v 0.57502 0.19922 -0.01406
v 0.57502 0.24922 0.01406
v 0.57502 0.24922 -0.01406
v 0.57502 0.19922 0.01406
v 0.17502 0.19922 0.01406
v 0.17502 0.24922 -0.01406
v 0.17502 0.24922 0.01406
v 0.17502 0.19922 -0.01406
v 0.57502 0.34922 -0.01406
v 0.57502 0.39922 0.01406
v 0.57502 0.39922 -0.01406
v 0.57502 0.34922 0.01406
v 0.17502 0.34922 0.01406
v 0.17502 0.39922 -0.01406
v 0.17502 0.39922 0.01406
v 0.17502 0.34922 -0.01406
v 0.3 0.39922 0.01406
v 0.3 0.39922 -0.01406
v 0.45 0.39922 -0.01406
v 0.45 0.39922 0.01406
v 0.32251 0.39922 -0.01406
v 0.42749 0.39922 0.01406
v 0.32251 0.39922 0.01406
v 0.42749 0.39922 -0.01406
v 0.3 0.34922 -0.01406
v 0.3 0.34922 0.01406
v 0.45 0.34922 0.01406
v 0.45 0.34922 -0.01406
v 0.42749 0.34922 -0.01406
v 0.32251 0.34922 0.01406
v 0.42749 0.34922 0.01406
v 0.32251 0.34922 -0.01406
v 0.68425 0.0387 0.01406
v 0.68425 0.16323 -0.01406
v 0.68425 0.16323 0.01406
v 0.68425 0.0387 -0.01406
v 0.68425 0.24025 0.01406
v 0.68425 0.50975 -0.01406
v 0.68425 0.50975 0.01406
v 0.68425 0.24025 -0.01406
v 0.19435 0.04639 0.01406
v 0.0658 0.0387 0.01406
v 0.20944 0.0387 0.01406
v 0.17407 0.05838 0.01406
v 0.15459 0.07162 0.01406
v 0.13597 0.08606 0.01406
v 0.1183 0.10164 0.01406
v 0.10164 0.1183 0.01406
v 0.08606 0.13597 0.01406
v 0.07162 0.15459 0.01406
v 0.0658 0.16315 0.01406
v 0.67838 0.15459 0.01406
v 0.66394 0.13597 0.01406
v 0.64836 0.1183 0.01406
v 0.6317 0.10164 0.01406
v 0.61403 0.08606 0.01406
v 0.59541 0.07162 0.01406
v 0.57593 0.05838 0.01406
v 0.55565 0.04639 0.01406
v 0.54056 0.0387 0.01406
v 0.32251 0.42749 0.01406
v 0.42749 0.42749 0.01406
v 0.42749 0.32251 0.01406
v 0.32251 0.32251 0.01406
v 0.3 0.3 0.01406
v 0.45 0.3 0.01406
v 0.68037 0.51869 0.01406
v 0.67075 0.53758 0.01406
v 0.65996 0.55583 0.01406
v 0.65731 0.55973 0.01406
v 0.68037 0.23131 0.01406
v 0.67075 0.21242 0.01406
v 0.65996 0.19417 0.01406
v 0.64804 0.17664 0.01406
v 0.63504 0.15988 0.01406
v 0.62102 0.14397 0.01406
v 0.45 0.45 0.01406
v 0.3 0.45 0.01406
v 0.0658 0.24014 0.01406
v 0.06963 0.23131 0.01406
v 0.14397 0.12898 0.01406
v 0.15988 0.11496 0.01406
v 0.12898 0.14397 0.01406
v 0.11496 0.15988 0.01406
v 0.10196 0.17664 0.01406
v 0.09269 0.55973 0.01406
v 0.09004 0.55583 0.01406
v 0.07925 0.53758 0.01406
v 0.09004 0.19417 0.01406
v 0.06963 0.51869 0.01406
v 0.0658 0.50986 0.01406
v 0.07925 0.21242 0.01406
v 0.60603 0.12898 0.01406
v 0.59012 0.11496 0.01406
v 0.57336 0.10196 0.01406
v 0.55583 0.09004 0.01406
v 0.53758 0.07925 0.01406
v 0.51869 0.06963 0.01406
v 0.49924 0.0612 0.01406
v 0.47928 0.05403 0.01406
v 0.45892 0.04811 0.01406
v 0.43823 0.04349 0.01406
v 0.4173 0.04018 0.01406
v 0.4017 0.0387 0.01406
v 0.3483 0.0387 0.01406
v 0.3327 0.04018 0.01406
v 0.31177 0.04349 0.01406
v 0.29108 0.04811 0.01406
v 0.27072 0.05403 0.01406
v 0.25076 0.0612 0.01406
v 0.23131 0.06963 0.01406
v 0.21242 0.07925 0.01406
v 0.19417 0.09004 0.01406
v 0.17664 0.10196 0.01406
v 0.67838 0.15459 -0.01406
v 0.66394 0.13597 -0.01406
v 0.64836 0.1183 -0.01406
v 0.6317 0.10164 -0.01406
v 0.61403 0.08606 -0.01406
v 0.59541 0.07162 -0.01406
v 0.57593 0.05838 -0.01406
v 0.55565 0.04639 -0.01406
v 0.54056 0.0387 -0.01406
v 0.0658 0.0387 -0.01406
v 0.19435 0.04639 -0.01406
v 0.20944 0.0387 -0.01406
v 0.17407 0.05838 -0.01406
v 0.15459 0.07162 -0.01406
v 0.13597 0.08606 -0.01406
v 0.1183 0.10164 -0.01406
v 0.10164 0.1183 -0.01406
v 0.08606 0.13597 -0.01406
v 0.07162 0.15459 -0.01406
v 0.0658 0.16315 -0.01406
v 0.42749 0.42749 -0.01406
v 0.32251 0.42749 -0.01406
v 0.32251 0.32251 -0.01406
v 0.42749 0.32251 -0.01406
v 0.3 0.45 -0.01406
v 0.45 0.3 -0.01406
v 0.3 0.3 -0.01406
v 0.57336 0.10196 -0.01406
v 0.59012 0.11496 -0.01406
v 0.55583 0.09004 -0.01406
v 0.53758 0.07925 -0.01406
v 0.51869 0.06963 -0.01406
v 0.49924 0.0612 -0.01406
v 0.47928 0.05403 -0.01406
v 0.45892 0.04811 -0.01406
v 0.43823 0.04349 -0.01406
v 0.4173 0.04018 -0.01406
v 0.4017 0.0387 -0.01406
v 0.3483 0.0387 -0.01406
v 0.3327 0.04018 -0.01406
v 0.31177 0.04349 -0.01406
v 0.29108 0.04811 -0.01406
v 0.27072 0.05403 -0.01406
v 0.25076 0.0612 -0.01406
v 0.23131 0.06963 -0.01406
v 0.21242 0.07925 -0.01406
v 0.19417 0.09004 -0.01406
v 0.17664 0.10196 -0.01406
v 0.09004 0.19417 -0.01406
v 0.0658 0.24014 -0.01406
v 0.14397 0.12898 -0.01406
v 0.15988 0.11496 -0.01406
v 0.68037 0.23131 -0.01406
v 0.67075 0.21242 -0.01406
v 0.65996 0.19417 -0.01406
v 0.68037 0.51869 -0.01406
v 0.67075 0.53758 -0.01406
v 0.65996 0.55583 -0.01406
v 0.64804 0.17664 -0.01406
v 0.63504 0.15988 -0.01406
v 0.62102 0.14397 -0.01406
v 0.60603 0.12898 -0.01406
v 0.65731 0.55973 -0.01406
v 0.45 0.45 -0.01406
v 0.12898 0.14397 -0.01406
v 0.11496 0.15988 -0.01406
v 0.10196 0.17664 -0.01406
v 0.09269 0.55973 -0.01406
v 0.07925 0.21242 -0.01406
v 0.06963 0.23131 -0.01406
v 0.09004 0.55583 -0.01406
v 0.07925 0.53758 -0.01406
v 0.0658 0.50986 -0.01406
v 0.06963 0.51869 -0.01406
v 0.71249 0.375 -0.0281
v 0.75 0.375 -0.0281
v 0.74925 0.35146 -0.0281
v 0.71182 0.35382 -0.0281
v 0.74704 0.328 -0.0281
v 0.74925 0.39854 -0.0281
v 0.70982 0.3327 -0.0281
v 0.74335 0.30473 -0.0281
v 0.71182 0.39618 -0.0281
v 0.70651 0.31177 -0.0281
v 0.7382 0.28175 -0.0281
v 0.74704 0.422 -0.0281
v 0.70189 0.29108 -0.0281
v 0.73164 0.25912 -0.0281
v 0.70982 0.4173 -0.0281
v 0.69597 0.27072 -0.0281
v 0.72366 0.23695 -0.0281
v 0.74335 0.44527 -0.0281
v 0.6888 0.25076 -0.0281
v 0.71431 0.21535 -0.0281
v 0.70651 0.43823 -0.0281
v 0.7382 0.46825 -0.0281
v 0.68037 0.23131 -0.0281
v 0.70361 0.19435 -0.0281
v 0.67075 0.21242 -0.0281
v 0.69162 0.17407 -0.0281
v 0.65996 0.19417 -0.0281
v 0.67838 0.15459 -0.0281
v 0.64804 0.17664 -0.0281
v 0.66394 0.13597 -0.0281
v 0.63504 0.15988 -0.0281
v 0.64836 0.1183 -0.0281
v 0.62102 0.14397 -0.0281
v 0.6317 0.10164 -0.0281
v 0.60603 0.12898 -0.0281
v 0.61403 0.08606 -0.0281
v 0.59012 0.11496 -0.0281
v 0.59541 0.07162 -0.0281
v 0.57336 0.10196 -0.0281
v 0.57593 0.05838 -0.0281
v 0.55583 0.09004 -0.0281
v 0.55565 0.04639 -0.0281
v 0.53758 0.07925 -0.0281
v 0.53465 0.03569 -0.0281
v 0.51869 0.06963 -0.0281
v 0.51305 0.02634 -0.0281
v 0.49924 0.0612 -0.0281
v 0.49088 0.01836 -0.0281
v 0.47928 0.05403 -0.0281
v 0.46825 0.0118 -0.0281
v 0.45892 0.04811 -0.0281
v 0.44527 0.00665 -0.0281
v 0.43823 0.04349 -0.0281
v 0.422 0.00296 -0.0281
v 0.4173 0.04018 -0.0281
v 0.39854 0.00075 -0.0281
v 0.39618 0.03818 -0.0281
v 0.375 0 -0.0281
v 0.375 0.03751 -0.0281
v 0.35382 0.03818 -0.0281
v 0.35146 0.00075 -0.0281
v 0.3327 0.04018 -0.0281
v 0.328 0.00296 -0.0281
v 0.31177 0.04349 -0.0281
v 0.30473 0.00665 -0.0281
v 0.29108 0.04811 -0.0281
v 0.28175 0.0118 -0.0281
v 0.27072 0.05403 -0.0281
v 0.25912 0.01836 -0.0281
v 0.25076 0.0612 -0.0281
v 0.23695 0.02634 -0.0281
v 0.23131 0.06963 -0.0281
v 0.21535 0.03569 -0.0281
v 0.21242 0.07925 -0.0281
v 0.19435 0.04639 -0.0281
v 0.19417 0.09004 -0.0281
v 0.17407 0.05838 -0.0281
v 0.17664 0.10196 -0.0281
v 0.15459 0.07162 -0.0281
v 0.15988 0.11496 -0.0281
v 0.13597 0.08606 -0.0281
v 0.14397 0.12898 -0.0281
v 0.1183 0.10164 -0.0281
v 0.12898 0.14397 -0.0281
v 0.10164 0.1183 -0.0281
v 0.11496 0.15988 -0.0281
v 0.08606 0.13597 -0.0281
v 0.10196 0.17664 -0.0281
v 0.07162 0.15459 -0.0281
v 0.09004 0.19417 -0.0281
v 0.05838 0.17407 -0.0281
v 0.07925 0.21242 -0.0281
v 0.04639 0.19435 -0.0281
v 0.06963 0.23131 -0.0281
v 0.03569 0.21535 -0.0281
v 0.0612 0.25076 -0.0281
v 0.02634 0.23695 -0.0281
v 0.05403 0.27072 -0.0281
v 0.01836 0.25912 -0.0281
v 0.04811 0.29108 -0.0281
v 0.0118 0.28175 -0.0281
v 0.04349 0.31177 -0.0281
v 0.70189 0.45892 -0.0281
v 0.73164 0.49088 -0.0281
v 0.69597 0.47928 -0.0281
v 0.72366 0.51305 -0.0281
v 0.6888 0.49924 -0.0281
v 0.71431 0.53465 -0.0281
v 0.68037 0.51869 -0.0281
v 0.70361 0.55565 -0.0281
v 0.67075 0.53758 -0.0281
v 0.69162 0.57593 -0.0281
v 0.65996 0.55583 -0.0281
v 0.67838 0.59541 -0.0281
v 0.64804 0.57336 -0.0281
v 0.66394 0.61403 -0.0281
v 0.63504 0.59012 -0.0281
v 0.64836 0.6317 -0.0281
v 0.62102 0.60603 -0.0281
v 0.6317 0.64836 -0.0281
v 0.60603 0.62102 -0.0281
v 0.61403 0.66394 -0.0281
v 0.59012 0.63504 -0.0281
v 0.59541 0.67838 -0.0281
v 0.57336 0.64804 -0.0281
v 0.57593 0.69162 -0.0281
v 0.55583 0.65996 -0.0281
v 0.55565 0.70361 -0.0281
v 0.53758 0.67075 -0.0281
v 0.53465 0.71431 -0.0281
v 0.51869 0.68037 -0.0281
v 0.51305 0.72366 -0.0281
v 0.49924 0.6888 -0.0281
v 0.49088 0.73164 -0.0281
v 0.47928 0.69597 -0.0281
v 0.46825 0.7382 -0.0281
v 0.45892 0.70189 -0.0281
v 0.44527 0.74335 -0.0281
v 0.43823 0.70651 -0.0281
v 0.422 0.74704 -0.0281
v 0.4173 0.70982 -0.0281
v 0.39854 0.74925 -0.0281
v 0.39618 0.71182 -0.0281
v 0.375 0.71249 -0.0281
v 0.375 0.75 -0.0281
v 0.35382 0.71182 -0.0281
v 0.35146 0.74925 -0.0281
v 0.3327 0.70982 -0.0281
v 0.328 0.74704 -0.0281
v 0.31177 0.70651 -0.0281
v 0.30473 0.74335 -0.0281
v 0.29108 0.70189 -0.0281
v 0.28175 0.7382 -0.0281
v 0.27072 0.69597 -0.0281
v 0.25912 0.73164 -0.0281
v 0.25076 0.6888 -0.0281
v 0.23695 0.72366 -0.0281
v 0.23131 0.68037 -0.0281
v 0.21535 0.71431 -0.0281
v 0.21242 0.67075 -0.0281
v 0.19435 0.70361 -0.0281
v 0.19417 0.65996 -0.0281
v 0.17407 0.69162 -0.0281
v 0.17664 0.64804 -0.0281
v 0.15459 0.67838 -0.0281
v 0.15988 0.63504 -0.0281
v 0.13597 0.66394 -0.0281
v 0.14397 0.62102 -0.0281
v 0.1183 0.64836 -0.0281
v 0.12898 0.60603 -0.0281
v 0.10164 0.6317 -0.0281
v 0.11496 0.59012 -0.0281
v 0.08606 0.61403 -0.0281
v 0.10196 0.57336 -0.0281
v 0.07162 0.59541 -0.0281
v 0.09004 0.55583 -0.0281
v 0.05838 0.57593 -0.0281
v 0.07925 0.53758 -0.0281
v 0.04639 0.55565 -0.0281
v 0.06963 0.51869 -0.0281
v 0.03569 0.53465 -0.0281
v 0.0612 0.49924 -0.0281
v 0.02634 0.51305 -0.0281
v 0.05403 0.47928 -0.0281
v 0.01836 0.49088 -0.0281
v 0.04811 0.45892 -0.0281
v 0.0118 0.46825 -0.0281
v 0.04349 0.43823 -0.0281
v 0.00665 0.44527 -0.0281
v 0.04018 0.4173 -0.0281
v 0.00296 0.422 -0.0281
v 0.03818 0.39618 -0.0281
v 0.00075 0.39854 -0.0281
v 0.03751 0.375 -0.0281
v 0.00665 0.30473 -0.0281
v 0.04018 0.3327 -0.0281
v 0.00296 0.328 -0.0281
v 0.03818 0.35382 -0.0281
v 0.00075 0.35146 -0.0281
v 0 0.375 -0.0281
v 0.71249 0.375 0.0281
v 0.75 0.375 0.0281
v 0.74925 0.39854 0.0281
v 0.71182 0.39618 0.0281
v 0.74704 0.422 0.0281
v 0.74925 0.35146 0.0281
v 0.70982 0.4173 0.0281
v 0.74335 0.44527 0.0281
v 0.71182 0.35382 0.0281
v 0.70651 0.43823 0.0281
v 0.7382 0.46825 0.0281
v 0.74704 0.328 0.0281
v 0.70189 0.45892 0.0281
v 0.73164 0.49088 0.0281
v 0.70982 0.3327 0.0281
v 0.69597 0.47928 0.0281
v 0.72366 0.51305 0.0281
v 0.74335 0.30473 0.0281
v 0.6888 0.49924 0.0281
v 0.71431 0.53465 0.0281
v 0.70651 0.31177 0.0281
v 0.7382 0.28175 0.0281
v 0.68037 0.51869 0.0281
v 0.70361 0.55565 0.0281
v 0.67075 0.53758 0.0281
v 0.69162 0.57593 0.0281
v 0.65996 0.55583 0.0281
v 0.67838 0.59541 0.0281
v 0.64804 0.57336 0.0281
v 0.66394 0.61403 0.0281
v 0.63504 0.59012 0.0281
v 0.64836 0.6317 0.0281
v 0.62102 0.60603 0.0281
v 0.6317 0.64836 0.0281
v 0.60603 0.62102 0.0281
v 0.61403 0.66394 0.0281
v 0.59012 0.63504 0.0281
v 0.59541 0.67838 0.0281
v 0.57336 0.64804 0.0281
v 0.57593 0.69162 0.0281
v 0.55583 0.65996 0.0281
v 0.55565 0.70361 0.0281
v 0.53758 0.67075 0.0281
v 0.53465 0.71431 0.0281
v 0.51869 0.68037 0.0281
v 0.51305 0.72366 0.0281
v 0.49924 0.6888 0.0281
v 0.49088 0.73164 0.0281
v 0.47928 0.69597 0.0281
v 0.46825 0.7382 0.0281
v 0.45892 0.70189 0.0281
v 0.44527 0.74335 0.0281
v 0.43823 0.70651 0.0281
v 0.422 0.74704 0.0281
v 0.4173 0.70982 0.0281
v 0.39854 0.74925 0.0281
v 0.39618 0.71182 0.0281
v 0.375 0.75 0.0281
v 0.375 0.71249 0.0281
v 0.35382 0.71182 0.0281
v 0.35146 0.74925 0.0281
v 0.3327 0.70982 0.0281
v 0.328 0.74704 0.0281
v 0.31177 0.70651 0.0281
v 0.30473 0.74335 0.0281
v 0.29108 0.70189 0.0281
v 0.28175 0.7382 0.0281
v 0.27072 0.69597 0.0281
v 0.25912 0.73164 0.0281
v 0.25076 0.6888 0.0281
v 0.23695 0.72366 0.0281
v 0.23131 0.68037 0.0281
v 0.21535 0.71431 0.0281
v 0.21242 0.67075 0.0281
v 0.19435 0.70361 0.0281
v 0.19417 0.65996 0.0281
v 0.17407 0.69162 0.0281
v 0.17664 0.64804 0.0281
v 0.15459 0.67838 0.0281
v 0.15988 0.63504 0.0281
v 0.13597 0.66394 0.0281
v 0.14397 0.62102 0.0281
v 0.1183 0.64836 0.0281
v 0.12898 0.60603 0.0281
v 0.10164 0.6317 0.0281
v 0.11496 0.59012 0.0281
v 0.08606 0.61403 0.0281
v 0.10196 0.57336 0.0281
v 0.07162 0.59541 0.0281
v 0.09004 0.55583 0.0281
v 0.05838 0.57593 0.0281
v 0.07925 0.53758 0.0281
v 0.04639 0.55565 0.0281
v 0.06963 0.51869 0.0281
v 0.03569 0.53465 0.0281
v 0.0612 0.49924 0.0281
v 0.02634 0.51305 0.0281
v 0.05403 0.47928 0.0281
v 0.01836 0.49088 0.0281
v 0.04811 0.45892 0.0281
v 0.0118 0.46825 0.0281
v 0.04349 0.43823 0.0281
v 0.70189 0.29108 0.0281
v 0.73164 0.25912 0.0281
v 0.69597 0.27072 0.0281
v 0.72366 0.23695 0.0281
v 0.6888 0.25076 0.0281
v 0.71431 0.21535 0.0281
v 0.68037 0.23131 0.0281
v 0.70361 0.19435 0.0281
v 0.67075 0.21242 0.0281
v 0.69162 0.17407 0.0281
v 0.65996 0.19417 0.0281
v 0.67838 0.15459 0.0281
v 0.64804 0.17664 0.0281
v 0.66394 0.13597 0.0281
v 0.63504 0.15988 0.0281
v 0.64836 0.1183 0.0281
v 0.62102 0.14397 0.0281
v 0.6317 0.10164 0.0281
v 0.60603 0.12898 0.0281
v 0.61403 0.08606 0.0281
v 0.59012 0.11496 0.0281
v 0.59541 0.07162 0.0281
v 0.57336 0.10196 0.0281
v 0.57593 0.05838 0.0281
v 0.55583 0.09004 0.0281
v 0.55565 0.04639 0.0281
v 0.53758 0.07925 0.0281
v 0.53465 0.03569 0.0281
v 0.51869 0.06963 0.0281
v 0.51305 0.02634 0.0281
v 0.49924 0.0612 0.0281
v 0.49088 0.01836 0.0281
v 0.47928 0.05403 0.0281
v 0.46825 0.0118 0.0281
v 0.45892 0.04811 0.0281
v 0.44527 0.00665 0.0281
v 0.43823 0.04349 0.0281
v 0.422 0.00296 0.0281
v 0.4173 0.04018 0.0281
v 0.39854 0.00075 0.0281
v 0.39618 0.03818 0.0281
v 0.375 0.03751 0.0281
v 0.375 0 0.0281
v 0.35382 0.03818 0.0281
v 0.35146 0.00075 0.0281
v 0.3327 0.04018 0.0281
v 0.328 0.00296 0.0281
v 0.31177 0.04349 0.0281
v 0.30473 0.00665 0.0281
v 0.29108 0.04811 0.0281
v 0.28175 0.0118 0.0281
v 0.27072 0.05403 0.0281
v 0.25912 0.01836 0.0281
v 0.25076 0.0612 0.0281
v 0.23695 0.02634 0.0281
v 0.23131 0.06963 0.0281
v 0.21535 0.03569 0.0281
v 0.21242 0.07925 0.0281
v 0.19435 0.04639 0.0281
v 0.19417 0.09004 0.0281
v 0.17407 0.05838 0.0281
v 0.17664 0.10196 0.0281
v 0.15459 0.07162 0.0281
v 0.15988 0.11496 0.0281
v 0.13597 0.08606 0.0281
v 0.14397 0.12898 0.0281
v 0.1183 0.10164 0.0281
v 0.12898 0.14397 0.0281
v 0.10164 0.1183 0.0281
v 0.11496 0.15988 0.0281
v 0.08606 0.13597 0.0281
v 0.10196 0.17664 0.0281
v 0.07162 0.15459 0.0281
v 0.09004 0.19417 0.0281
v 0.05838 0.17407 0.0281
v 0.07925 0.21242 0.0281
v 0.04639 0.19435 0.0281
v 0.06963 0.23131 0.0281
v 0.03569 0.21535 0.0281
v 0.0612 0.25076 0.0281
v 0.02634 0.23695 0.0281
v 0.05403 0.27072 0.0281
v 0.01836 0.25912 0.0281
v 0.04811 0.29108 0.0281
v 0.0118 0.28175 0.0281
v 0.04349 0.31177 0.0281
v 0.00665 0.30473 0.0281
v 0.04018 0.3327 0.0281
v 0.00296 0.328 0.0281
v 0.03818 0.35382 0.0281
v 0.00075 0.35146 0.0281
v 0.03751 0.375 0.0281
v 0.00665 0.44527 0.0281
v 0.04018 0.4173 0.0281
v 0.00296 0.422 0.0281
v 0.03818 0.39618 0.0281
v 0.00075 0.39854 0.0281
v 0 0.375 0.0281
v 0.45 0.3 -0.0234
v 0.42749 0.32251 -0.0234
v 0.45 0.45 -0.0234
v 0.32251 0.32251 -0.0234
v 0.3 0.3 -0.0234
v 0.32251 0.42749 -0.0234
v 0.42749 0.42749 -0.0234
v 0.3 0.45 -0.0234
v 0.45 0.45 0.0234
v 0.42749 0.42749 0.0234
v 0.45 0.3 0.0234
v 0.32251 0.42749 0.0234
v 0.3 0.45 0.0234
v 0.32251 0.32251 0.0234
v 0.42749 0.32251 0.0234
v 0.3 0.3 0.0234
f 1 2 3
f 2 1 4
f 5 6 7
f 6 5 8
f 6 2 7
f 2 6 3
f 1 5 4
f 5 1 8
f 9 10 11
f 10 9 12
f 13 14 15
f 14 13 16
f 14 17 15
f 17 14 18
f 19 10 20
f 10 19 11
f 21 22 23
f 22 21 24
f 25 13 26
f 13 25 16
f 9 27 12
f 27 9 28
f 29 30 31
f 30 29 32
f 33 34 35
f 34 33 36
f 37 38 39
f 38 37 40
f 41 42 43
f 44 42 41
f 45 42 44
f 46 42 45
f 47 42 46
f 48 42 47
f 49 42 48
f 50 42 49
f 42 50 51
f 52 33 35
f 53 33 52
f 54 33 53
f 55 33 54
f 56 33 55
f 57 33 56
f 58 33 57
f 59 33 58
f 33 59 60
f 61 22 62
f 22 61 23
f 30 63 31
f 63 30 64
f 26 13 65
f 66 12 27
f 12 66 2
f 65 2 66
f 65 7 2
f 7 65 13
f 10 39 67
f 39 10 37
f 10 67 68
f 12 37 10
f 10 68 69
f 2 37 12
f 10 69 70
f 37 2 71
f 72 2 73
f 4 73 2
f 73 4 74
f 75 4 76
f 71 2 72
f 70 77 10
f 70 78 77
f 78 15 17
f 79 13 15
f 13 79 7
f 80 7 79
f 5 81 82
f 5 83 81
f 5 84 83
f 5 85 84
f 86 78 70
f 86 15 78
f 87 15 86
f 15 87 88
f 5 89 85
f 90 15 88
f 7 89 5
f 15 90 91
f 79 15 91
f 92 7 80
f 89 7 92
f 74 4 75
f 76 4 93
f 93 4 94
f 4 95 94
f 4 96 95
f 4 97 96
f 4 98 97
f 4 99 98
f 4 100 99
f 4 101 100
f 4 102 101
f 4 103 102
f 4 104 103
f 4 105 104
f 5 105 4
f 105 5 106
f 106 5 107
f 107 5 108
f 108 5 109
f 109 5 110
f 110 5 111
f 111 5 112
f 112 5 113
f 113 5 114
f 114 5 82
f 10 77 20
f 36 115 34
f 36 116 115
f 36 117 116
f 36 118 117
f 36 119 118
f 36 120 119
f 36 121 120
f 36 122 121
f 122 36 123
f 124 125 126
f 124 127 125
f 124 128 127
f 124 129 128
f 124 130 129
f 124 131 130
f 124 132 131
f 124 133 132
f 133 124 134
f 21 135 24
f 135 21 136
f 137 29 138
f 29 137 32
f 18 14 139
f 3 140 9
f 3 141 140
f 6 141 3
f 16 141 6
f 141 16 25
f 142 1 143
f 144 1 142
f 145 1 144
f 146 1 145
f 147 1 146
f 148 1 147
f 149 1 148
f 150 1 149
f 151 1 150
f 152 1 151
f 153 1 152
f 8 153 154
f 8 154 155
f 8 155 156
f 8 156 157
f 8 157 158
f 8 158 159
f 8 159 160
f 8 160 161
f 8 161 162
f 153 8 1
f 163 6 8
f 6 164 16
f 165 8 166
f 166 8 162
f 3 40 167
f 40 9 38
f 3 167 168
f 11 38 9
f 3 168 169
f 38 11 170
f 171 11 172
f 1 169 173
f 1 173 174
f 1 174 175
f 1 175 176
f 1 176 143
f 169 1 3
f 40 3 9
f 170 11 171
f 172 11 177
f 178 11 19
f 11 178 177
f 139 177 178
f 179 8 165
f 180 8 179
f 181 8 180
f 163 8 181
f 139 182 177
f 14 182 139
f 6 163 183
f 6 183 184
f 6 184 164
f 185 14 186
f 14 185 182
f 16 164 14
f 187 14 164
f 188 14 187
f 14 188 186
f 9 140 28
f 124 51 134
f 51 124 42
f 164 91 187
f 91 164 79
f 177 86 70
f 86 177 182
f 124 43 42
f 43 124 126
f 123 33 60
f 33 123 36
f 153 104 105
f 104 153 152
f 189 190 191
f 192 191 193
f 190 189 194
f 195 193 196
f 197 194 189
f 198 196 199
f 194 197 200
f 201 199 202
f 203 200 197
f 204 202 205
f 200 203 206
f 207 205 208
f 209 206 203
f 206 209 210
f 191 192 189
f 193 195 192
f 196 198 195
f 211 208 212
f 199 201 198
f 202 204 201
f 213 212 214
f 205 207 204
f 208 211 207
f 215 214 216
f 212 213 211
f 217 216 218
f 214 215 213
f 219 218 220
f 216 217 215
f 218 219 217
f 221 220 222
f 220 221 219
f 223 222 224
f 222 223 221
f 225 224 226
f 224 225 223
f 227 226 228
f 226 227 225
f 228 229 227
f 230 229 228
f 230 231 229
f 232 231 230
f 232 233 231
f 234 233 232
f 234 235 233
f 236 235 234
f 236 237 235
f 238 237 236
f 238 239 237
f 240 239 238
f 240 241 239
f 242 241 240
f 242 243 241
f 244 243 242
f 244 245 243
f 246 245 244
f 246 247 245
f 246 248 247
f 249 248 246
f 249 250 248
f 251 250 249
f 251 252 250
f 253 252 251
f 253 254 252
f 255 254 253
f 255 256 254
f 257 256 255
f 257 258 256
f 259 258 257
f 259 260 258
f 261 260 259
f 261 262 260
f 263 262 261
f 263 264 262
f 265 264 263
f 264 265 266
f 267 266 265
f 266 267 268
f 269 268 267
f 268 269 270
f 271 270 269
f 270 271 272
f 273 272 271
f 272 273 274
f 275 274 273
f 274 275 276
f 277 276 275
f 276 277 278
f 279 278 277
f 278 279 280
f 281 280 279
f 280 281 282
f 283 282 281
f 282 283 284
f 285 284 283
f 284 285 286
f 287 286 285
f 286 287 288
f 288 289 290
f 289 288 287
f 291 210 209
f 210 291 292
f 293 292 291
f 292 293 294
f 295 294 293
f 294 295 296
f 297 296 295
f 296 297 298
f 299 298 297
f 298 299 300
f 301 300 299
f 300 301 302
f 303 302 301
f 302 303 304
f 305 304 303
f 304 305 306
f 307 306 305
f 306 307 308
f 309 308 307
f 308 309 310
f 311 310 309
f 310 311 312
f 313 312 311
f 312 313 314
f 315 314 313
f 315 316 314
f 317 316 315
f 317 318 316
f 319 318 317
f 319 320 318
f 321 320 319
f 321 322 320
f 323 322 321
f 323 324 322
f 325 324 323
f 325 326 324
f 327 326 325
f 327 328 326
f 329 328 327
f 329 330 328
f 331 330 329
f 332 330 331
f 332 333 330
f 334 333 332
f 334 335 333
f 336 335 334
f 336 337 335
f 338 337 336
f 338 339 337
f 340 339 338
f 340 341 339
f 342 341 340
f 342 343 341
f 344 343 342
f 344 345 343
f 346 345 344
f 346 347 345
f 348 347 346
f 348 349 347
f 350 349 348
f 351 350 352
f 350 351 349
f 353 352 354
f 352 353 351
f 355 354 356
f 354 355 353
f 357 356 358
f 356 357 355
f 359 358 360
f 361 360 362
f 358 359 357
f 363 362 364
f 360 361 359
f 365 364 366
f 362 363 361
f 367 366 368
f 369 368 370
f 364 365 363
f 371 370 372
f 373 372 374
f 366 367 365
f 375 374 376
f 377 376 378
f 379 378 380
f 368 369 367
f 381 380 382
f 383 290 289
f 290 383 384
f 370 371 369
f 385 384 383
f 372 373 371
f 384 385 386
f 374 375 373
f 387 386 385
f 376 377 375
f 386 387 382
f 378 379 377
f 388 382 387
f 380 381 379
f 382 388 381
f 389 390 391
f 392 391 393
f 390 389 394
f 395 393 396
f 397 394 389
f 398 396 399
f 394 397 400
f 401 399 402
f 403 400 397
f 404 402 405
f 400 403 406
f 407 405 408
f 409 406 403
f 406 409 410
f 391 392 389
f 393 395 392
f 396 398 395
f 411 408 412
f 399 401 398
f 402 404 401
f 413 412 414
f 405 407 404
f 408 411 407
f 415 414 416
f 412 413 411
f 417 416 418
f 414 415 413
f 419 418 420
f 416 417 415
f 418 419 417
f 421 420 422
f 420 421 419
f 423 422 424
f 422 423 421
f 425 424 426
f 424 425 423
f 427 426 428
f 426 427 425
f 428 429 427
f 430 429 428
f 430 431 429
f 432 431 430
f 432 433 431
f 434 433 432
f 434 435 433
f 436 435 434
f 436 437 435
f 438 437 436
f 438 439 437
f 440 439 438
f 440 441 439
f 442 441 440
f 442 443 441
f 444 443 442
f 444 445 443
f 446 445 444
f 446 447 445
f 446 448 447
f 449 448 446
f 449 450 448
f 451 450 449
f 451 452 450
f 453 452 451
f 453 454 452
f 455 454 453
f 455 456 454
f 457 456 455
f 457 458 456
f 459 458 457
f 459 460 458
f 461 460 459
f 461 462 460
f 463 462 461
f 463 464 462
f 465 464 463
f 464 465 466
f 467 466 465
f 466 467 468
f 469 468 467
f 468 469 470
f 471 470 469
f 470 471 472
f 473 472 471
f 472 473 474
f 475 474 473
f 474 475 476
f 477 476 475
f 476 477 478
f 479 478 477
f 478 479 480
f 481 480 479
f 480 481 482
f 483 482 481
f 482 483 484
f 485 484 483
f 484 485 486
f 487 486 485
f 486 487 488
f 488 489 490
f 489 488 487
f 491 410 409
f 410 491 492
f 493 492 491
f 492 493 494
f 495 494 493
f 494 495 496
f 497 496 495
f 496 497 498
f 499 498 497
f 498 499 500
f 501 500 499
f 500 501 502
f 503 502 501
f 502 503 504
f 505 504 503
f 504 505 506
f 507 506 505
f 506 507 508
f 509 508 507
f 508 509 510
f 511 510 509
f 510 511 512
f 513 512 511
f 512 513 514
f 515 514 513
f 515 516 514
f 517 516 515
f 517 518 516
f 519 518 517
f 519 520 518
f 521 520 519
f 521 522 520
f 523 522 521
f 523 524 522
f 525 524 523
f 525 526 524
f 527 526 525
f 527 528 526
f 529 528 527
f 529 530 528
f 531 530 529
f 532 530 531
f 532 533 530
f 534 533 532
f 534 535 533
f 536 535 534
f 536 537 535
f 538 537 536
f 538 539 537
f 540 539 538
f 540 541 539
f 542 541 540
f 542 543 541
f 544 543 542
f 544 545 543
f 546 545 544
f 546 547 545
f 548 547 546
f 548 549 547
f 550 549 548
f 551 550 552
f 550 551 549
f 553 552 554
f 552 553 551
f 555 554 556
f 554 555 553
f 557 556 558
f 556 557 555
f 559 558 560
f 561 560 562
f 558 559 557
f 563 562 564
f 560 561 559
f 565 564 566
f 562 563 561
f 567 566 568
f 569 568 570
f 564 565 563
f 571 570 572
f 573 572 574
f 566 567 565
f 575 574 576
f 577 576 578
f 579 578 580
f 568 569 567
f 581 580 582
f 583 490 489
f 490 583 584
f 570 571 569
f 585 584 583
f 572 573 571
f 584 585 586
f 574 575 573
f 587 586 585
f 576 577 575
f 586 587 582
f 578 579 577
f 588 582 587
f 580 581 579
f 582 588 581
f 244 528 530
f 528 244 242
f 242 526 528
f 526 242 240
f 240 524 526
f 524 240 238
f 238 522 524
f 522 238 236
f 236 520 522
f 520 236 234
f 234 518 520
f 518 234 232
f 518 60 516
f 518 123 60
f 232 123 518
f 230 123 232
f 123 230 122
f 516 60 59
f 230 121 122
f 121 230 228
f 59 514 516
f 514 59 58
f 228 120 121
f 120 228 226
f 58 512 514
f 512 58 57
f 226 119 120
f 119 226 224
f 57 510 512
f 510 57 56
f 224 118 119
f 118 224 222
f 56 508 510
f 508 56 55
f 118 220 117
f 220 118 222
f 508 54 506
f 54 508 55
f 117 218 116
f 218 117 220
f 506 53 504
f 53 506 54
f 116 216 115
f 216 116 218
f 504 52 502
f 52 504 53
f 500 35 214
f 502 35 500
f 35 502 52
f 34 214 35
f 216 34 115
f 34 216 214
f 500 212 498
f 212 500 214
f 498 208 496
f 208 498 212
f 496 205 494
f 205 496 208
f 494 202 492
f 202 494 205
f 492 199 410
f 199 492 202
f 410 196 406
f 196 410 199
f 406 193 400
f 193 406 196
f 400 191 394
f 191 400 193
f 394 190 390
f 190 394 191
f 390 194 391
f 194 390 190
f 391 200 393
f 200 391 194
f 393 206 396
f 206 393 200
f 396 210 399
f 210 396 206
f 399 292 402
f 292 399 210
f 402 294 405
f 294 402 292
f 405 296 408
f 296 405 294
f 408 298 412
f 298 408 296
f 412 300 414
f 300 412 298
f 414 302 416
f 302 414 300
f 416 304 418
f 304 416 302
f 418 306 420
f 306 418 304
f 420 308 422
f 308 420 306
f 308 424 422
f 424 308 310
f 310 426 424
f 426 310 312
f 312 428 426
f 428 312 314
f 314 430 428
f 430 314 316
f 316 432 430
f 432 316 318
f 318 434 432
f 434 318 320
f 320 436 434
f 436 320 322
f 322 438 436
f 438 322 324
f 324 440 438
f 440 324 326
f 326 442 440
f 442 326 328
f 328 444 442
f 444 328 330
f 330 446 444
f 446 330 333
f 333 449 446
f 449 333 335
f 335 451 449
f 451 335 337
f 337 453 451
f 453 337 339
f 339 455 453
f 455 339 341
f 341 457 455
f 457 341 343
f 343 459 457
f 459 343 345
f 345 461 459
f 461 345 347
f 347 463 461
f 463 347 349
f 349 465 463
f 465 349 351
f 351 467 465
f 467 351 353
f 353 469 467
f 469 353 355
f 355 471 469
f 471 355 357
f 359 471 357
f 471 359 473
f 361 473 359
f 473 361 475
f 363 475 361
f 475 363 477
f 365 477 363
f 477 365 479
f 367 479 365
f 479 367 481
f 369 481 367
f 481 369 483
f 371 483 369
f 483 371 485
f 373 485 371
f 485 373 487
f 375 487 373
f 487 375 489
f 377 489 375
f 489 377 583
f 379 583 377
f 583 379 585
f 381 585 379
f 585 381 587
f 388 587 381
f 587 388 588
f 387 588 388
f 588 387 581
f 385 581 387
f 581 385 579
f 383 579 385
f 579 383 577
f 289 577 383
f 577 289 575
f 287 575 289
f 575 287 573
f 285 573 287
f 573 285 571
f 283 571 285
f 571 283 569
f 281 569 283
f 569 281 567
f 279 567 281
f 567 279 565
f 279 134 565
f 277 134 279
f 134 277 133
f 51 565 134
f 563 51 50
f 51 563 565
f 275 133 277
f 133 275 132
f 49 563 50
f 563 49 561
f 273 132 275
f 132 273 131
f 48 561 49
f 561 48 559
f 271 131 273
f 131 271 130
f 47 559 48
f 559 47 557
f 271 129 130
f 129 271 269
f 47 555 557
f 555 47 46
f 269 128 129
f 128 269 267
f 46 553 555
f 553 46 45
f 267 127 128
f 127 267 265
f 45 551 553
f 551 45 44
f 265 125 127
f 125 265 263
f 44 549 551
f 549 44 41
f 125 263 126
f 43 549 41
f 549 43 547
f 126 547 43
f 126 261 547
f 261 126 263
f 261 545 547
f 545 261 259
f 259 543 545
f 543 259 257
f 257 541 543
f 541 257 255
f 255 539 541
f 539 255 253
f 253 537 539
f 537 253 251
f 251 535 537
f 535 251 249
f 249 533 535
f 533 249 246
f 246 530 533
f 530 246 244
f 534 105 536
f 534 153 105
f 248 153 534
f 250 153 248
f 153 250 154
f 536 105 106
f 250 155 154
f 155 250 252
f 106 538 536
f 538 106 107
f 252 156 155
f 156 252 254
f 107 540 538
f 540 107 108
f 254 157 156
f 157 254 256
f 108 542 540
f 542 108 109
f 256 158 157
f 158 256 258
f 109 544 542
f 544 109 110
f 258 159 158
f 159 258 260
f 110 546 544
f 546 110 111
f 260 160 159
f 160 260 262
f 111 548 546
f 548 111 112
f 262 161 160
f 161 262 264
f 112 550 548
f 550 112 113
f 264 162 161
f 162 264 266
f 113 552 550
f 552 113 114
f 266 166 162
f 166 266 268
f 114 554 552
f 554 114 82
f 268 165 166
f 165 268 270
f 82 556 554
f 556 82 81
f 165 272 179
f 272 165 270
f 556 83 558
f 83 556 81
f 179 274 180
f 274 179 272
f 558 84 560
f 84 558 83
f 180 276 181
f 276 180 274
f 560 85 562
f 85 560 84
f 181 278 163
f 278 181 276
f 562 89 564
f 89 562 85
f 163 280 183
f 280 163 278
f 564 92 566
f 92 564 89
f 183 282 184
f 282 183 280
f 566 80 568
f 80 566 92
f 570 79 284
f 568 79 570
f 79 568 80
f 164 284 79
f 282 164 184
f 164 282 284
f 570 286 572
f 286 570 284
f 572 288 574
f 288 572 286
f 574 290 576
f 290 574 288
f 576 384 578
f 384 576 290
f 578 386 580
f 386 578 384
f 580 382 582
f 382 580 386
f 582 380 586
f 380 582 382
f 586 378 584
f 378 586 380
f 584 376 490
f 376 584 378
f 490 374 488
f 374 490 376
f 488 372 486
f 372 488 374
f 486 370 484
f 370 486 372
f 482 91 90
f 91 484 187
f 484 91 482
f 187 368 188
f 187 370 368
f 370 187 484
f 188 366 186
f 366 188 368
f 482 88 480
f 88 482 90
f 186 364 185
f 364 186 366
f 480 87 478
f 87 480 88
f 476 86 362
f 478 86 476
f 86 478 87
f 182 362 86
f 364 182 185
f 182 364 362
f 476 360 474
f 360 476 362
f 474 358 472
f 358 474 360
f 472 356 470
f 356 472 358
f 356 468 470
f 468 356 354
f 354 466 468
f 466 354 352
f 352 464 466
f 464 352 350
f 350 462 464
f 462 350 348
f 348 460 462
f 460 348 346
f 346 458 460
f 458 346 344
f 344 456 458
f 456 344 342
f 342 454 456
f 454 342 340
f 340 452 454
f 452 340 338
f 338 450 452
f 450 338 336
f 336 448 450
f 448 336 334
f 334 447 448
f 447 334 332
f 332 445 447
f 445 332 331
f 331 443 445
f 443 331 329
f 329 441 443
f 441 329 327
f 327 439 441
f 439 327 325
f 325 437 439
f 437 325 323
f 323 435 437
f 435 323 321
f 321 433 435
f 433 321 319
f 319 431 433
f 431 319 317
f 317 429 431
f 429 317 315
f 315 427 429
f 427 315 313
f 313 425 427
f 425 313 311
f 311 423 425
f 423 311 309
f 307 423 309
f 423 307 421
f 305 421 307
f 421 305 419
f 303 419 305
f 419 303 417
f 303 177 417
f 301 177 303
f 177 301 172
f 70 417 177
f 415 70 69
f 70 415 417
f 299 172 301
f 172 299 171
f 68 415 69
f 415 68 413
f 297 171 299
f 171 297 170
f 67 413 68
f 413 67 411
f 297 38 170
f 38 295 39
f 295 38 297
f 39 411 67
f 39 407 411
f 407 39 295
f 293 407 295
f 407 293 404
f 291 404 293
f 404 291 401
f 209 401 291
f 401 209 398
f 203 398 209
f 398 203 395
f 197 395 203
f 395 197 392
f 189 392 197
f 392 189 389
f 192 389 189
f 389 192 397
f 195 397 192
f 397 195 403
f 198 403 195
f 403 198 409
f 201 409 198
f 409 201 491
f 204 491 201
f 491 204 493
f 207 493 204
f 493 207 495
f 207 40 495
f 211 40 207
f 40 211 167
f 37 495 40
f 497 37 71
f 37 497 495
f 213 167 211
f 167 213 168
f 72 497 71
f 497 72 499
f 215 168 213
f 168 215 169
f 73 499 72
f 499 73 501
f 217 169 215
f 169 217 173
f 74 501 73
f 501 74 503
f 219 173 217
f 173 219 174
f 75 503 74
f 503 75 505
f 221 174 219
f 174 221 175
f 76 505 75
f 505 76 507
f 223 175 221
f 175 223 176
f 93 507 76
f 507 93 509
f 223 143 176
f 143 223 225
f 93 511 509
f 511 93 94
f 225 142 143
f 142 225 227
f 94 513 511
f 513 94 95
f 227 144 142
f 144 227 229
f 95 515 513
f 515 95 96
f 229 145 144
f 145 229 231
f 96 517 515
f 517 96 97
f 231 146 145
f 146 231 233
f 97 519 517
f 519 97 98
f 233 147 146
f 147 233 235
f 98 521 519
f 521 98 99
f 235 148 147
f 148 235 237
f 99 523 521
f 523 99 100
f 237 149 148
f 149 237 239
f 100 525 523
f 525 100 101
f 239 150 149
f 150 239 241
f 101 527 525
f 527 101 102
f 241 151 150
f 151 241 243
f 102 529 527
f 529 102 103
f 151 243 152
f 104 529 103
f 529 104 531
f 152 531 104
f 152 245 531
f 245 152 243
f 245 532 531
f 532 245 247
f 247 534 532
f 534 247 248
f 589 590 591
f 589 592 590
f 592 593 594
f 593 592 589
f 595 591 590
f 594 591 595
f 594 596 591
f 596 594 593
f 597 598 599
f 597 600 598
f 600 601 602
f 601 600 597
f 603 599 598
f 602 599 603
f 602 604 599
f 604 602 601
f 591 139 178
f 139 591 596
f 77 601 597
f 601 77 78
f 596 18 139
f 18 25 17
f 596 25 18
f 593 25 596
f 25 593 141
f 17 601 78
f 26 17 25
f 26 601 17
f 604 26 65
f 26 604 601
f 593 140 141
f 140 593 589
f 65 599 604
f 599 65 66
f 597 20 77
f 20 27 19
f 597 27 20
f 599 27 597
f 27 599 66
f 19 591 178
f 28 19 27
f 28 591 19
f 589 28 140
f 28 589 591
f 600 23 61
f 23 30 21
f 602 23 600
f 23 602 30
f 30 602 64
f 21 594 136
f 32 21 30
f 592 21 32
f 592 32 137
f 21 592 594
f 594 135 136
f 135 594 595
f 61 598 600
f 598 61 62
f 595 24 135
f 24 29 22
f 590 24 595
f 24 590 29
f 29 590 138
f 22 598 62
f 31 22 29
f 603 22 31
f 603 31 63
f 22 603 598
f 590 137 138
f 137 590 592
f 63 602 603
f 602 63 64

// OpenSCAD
// Parameters
main_outer_radius = 0.375;
main_inner_radius = 0.3375;
main_height = 0.05625;
main_extrusion_depth = 0.0281;
main_center_offset = 0.375;

collar_footprint = 0.15;
collar_offset = 0.3;
collar_height = 0.0468; // 0.0234 * 2

rib_bounding_length = 0.6184;
rib_bounding_width = 0.521;
rib_offset_left = 0.0658;
rib_offset_right = 0.0658;
rib_offset_front = 0.0387;
rib_offset_back = 0.1903;
rib_length = 0.618448;
rib_width = 0.521035;
rib_height = 0.028125;
rib_z_start = -0.0141;
rib_z_end = 0.0141;

$fn = 100;

// Main base annulus
module main_base() {
    translate([main_center_offset, main_center_offset, 0])
    linear_extrude(height = main_extrusion_depth * 2, center = true)
    difference() {
        circle(r = main_outer_radius);
        circle(r = main_inner_radius);
    }
}

// Central collar annulus
module central_collar() {
    translate([main_center_offset, main_center_offset, 0])
    linear_extrude(height = collar_height, center = true)
    difference() {
        square([collar_footprint, collar_footprint], center = true);
        // Inner void - adjust size as needed
        square([collar_footprint * 0.7, collar_footprint * 0.7], center = true);
    }
}

// Rounded radial rib web with slot openings
module rib_web() {
    rib_center_x = rib_offset_left + rib_length / 2;
    rib_center_y = rib_offset_front + rib_width / 2;
    
    translate([rib_center_x, rib_center_y, (rib_z_start + rib_z_end) / 2])
    difference() {
        // Outer bounding shape
        cube([rib_length, rib_width, rib_height], center = true);
        
        // Create slot-like openings using difference
        // Example: two elongated slots
        slot_width = 0.05;
        slot_length = 0.4;
        slot_spacing = 0.15;
        
        for (i = [-1, 1]) {
            translate([0, i * slot_spacing / 2, 0])
            cube([slot_length, slot_width, rib_height + 1], center = true);
        }
    }
}

// Main assembly
union() {
    main_base();
    central_collar();
    rib_web();
}
